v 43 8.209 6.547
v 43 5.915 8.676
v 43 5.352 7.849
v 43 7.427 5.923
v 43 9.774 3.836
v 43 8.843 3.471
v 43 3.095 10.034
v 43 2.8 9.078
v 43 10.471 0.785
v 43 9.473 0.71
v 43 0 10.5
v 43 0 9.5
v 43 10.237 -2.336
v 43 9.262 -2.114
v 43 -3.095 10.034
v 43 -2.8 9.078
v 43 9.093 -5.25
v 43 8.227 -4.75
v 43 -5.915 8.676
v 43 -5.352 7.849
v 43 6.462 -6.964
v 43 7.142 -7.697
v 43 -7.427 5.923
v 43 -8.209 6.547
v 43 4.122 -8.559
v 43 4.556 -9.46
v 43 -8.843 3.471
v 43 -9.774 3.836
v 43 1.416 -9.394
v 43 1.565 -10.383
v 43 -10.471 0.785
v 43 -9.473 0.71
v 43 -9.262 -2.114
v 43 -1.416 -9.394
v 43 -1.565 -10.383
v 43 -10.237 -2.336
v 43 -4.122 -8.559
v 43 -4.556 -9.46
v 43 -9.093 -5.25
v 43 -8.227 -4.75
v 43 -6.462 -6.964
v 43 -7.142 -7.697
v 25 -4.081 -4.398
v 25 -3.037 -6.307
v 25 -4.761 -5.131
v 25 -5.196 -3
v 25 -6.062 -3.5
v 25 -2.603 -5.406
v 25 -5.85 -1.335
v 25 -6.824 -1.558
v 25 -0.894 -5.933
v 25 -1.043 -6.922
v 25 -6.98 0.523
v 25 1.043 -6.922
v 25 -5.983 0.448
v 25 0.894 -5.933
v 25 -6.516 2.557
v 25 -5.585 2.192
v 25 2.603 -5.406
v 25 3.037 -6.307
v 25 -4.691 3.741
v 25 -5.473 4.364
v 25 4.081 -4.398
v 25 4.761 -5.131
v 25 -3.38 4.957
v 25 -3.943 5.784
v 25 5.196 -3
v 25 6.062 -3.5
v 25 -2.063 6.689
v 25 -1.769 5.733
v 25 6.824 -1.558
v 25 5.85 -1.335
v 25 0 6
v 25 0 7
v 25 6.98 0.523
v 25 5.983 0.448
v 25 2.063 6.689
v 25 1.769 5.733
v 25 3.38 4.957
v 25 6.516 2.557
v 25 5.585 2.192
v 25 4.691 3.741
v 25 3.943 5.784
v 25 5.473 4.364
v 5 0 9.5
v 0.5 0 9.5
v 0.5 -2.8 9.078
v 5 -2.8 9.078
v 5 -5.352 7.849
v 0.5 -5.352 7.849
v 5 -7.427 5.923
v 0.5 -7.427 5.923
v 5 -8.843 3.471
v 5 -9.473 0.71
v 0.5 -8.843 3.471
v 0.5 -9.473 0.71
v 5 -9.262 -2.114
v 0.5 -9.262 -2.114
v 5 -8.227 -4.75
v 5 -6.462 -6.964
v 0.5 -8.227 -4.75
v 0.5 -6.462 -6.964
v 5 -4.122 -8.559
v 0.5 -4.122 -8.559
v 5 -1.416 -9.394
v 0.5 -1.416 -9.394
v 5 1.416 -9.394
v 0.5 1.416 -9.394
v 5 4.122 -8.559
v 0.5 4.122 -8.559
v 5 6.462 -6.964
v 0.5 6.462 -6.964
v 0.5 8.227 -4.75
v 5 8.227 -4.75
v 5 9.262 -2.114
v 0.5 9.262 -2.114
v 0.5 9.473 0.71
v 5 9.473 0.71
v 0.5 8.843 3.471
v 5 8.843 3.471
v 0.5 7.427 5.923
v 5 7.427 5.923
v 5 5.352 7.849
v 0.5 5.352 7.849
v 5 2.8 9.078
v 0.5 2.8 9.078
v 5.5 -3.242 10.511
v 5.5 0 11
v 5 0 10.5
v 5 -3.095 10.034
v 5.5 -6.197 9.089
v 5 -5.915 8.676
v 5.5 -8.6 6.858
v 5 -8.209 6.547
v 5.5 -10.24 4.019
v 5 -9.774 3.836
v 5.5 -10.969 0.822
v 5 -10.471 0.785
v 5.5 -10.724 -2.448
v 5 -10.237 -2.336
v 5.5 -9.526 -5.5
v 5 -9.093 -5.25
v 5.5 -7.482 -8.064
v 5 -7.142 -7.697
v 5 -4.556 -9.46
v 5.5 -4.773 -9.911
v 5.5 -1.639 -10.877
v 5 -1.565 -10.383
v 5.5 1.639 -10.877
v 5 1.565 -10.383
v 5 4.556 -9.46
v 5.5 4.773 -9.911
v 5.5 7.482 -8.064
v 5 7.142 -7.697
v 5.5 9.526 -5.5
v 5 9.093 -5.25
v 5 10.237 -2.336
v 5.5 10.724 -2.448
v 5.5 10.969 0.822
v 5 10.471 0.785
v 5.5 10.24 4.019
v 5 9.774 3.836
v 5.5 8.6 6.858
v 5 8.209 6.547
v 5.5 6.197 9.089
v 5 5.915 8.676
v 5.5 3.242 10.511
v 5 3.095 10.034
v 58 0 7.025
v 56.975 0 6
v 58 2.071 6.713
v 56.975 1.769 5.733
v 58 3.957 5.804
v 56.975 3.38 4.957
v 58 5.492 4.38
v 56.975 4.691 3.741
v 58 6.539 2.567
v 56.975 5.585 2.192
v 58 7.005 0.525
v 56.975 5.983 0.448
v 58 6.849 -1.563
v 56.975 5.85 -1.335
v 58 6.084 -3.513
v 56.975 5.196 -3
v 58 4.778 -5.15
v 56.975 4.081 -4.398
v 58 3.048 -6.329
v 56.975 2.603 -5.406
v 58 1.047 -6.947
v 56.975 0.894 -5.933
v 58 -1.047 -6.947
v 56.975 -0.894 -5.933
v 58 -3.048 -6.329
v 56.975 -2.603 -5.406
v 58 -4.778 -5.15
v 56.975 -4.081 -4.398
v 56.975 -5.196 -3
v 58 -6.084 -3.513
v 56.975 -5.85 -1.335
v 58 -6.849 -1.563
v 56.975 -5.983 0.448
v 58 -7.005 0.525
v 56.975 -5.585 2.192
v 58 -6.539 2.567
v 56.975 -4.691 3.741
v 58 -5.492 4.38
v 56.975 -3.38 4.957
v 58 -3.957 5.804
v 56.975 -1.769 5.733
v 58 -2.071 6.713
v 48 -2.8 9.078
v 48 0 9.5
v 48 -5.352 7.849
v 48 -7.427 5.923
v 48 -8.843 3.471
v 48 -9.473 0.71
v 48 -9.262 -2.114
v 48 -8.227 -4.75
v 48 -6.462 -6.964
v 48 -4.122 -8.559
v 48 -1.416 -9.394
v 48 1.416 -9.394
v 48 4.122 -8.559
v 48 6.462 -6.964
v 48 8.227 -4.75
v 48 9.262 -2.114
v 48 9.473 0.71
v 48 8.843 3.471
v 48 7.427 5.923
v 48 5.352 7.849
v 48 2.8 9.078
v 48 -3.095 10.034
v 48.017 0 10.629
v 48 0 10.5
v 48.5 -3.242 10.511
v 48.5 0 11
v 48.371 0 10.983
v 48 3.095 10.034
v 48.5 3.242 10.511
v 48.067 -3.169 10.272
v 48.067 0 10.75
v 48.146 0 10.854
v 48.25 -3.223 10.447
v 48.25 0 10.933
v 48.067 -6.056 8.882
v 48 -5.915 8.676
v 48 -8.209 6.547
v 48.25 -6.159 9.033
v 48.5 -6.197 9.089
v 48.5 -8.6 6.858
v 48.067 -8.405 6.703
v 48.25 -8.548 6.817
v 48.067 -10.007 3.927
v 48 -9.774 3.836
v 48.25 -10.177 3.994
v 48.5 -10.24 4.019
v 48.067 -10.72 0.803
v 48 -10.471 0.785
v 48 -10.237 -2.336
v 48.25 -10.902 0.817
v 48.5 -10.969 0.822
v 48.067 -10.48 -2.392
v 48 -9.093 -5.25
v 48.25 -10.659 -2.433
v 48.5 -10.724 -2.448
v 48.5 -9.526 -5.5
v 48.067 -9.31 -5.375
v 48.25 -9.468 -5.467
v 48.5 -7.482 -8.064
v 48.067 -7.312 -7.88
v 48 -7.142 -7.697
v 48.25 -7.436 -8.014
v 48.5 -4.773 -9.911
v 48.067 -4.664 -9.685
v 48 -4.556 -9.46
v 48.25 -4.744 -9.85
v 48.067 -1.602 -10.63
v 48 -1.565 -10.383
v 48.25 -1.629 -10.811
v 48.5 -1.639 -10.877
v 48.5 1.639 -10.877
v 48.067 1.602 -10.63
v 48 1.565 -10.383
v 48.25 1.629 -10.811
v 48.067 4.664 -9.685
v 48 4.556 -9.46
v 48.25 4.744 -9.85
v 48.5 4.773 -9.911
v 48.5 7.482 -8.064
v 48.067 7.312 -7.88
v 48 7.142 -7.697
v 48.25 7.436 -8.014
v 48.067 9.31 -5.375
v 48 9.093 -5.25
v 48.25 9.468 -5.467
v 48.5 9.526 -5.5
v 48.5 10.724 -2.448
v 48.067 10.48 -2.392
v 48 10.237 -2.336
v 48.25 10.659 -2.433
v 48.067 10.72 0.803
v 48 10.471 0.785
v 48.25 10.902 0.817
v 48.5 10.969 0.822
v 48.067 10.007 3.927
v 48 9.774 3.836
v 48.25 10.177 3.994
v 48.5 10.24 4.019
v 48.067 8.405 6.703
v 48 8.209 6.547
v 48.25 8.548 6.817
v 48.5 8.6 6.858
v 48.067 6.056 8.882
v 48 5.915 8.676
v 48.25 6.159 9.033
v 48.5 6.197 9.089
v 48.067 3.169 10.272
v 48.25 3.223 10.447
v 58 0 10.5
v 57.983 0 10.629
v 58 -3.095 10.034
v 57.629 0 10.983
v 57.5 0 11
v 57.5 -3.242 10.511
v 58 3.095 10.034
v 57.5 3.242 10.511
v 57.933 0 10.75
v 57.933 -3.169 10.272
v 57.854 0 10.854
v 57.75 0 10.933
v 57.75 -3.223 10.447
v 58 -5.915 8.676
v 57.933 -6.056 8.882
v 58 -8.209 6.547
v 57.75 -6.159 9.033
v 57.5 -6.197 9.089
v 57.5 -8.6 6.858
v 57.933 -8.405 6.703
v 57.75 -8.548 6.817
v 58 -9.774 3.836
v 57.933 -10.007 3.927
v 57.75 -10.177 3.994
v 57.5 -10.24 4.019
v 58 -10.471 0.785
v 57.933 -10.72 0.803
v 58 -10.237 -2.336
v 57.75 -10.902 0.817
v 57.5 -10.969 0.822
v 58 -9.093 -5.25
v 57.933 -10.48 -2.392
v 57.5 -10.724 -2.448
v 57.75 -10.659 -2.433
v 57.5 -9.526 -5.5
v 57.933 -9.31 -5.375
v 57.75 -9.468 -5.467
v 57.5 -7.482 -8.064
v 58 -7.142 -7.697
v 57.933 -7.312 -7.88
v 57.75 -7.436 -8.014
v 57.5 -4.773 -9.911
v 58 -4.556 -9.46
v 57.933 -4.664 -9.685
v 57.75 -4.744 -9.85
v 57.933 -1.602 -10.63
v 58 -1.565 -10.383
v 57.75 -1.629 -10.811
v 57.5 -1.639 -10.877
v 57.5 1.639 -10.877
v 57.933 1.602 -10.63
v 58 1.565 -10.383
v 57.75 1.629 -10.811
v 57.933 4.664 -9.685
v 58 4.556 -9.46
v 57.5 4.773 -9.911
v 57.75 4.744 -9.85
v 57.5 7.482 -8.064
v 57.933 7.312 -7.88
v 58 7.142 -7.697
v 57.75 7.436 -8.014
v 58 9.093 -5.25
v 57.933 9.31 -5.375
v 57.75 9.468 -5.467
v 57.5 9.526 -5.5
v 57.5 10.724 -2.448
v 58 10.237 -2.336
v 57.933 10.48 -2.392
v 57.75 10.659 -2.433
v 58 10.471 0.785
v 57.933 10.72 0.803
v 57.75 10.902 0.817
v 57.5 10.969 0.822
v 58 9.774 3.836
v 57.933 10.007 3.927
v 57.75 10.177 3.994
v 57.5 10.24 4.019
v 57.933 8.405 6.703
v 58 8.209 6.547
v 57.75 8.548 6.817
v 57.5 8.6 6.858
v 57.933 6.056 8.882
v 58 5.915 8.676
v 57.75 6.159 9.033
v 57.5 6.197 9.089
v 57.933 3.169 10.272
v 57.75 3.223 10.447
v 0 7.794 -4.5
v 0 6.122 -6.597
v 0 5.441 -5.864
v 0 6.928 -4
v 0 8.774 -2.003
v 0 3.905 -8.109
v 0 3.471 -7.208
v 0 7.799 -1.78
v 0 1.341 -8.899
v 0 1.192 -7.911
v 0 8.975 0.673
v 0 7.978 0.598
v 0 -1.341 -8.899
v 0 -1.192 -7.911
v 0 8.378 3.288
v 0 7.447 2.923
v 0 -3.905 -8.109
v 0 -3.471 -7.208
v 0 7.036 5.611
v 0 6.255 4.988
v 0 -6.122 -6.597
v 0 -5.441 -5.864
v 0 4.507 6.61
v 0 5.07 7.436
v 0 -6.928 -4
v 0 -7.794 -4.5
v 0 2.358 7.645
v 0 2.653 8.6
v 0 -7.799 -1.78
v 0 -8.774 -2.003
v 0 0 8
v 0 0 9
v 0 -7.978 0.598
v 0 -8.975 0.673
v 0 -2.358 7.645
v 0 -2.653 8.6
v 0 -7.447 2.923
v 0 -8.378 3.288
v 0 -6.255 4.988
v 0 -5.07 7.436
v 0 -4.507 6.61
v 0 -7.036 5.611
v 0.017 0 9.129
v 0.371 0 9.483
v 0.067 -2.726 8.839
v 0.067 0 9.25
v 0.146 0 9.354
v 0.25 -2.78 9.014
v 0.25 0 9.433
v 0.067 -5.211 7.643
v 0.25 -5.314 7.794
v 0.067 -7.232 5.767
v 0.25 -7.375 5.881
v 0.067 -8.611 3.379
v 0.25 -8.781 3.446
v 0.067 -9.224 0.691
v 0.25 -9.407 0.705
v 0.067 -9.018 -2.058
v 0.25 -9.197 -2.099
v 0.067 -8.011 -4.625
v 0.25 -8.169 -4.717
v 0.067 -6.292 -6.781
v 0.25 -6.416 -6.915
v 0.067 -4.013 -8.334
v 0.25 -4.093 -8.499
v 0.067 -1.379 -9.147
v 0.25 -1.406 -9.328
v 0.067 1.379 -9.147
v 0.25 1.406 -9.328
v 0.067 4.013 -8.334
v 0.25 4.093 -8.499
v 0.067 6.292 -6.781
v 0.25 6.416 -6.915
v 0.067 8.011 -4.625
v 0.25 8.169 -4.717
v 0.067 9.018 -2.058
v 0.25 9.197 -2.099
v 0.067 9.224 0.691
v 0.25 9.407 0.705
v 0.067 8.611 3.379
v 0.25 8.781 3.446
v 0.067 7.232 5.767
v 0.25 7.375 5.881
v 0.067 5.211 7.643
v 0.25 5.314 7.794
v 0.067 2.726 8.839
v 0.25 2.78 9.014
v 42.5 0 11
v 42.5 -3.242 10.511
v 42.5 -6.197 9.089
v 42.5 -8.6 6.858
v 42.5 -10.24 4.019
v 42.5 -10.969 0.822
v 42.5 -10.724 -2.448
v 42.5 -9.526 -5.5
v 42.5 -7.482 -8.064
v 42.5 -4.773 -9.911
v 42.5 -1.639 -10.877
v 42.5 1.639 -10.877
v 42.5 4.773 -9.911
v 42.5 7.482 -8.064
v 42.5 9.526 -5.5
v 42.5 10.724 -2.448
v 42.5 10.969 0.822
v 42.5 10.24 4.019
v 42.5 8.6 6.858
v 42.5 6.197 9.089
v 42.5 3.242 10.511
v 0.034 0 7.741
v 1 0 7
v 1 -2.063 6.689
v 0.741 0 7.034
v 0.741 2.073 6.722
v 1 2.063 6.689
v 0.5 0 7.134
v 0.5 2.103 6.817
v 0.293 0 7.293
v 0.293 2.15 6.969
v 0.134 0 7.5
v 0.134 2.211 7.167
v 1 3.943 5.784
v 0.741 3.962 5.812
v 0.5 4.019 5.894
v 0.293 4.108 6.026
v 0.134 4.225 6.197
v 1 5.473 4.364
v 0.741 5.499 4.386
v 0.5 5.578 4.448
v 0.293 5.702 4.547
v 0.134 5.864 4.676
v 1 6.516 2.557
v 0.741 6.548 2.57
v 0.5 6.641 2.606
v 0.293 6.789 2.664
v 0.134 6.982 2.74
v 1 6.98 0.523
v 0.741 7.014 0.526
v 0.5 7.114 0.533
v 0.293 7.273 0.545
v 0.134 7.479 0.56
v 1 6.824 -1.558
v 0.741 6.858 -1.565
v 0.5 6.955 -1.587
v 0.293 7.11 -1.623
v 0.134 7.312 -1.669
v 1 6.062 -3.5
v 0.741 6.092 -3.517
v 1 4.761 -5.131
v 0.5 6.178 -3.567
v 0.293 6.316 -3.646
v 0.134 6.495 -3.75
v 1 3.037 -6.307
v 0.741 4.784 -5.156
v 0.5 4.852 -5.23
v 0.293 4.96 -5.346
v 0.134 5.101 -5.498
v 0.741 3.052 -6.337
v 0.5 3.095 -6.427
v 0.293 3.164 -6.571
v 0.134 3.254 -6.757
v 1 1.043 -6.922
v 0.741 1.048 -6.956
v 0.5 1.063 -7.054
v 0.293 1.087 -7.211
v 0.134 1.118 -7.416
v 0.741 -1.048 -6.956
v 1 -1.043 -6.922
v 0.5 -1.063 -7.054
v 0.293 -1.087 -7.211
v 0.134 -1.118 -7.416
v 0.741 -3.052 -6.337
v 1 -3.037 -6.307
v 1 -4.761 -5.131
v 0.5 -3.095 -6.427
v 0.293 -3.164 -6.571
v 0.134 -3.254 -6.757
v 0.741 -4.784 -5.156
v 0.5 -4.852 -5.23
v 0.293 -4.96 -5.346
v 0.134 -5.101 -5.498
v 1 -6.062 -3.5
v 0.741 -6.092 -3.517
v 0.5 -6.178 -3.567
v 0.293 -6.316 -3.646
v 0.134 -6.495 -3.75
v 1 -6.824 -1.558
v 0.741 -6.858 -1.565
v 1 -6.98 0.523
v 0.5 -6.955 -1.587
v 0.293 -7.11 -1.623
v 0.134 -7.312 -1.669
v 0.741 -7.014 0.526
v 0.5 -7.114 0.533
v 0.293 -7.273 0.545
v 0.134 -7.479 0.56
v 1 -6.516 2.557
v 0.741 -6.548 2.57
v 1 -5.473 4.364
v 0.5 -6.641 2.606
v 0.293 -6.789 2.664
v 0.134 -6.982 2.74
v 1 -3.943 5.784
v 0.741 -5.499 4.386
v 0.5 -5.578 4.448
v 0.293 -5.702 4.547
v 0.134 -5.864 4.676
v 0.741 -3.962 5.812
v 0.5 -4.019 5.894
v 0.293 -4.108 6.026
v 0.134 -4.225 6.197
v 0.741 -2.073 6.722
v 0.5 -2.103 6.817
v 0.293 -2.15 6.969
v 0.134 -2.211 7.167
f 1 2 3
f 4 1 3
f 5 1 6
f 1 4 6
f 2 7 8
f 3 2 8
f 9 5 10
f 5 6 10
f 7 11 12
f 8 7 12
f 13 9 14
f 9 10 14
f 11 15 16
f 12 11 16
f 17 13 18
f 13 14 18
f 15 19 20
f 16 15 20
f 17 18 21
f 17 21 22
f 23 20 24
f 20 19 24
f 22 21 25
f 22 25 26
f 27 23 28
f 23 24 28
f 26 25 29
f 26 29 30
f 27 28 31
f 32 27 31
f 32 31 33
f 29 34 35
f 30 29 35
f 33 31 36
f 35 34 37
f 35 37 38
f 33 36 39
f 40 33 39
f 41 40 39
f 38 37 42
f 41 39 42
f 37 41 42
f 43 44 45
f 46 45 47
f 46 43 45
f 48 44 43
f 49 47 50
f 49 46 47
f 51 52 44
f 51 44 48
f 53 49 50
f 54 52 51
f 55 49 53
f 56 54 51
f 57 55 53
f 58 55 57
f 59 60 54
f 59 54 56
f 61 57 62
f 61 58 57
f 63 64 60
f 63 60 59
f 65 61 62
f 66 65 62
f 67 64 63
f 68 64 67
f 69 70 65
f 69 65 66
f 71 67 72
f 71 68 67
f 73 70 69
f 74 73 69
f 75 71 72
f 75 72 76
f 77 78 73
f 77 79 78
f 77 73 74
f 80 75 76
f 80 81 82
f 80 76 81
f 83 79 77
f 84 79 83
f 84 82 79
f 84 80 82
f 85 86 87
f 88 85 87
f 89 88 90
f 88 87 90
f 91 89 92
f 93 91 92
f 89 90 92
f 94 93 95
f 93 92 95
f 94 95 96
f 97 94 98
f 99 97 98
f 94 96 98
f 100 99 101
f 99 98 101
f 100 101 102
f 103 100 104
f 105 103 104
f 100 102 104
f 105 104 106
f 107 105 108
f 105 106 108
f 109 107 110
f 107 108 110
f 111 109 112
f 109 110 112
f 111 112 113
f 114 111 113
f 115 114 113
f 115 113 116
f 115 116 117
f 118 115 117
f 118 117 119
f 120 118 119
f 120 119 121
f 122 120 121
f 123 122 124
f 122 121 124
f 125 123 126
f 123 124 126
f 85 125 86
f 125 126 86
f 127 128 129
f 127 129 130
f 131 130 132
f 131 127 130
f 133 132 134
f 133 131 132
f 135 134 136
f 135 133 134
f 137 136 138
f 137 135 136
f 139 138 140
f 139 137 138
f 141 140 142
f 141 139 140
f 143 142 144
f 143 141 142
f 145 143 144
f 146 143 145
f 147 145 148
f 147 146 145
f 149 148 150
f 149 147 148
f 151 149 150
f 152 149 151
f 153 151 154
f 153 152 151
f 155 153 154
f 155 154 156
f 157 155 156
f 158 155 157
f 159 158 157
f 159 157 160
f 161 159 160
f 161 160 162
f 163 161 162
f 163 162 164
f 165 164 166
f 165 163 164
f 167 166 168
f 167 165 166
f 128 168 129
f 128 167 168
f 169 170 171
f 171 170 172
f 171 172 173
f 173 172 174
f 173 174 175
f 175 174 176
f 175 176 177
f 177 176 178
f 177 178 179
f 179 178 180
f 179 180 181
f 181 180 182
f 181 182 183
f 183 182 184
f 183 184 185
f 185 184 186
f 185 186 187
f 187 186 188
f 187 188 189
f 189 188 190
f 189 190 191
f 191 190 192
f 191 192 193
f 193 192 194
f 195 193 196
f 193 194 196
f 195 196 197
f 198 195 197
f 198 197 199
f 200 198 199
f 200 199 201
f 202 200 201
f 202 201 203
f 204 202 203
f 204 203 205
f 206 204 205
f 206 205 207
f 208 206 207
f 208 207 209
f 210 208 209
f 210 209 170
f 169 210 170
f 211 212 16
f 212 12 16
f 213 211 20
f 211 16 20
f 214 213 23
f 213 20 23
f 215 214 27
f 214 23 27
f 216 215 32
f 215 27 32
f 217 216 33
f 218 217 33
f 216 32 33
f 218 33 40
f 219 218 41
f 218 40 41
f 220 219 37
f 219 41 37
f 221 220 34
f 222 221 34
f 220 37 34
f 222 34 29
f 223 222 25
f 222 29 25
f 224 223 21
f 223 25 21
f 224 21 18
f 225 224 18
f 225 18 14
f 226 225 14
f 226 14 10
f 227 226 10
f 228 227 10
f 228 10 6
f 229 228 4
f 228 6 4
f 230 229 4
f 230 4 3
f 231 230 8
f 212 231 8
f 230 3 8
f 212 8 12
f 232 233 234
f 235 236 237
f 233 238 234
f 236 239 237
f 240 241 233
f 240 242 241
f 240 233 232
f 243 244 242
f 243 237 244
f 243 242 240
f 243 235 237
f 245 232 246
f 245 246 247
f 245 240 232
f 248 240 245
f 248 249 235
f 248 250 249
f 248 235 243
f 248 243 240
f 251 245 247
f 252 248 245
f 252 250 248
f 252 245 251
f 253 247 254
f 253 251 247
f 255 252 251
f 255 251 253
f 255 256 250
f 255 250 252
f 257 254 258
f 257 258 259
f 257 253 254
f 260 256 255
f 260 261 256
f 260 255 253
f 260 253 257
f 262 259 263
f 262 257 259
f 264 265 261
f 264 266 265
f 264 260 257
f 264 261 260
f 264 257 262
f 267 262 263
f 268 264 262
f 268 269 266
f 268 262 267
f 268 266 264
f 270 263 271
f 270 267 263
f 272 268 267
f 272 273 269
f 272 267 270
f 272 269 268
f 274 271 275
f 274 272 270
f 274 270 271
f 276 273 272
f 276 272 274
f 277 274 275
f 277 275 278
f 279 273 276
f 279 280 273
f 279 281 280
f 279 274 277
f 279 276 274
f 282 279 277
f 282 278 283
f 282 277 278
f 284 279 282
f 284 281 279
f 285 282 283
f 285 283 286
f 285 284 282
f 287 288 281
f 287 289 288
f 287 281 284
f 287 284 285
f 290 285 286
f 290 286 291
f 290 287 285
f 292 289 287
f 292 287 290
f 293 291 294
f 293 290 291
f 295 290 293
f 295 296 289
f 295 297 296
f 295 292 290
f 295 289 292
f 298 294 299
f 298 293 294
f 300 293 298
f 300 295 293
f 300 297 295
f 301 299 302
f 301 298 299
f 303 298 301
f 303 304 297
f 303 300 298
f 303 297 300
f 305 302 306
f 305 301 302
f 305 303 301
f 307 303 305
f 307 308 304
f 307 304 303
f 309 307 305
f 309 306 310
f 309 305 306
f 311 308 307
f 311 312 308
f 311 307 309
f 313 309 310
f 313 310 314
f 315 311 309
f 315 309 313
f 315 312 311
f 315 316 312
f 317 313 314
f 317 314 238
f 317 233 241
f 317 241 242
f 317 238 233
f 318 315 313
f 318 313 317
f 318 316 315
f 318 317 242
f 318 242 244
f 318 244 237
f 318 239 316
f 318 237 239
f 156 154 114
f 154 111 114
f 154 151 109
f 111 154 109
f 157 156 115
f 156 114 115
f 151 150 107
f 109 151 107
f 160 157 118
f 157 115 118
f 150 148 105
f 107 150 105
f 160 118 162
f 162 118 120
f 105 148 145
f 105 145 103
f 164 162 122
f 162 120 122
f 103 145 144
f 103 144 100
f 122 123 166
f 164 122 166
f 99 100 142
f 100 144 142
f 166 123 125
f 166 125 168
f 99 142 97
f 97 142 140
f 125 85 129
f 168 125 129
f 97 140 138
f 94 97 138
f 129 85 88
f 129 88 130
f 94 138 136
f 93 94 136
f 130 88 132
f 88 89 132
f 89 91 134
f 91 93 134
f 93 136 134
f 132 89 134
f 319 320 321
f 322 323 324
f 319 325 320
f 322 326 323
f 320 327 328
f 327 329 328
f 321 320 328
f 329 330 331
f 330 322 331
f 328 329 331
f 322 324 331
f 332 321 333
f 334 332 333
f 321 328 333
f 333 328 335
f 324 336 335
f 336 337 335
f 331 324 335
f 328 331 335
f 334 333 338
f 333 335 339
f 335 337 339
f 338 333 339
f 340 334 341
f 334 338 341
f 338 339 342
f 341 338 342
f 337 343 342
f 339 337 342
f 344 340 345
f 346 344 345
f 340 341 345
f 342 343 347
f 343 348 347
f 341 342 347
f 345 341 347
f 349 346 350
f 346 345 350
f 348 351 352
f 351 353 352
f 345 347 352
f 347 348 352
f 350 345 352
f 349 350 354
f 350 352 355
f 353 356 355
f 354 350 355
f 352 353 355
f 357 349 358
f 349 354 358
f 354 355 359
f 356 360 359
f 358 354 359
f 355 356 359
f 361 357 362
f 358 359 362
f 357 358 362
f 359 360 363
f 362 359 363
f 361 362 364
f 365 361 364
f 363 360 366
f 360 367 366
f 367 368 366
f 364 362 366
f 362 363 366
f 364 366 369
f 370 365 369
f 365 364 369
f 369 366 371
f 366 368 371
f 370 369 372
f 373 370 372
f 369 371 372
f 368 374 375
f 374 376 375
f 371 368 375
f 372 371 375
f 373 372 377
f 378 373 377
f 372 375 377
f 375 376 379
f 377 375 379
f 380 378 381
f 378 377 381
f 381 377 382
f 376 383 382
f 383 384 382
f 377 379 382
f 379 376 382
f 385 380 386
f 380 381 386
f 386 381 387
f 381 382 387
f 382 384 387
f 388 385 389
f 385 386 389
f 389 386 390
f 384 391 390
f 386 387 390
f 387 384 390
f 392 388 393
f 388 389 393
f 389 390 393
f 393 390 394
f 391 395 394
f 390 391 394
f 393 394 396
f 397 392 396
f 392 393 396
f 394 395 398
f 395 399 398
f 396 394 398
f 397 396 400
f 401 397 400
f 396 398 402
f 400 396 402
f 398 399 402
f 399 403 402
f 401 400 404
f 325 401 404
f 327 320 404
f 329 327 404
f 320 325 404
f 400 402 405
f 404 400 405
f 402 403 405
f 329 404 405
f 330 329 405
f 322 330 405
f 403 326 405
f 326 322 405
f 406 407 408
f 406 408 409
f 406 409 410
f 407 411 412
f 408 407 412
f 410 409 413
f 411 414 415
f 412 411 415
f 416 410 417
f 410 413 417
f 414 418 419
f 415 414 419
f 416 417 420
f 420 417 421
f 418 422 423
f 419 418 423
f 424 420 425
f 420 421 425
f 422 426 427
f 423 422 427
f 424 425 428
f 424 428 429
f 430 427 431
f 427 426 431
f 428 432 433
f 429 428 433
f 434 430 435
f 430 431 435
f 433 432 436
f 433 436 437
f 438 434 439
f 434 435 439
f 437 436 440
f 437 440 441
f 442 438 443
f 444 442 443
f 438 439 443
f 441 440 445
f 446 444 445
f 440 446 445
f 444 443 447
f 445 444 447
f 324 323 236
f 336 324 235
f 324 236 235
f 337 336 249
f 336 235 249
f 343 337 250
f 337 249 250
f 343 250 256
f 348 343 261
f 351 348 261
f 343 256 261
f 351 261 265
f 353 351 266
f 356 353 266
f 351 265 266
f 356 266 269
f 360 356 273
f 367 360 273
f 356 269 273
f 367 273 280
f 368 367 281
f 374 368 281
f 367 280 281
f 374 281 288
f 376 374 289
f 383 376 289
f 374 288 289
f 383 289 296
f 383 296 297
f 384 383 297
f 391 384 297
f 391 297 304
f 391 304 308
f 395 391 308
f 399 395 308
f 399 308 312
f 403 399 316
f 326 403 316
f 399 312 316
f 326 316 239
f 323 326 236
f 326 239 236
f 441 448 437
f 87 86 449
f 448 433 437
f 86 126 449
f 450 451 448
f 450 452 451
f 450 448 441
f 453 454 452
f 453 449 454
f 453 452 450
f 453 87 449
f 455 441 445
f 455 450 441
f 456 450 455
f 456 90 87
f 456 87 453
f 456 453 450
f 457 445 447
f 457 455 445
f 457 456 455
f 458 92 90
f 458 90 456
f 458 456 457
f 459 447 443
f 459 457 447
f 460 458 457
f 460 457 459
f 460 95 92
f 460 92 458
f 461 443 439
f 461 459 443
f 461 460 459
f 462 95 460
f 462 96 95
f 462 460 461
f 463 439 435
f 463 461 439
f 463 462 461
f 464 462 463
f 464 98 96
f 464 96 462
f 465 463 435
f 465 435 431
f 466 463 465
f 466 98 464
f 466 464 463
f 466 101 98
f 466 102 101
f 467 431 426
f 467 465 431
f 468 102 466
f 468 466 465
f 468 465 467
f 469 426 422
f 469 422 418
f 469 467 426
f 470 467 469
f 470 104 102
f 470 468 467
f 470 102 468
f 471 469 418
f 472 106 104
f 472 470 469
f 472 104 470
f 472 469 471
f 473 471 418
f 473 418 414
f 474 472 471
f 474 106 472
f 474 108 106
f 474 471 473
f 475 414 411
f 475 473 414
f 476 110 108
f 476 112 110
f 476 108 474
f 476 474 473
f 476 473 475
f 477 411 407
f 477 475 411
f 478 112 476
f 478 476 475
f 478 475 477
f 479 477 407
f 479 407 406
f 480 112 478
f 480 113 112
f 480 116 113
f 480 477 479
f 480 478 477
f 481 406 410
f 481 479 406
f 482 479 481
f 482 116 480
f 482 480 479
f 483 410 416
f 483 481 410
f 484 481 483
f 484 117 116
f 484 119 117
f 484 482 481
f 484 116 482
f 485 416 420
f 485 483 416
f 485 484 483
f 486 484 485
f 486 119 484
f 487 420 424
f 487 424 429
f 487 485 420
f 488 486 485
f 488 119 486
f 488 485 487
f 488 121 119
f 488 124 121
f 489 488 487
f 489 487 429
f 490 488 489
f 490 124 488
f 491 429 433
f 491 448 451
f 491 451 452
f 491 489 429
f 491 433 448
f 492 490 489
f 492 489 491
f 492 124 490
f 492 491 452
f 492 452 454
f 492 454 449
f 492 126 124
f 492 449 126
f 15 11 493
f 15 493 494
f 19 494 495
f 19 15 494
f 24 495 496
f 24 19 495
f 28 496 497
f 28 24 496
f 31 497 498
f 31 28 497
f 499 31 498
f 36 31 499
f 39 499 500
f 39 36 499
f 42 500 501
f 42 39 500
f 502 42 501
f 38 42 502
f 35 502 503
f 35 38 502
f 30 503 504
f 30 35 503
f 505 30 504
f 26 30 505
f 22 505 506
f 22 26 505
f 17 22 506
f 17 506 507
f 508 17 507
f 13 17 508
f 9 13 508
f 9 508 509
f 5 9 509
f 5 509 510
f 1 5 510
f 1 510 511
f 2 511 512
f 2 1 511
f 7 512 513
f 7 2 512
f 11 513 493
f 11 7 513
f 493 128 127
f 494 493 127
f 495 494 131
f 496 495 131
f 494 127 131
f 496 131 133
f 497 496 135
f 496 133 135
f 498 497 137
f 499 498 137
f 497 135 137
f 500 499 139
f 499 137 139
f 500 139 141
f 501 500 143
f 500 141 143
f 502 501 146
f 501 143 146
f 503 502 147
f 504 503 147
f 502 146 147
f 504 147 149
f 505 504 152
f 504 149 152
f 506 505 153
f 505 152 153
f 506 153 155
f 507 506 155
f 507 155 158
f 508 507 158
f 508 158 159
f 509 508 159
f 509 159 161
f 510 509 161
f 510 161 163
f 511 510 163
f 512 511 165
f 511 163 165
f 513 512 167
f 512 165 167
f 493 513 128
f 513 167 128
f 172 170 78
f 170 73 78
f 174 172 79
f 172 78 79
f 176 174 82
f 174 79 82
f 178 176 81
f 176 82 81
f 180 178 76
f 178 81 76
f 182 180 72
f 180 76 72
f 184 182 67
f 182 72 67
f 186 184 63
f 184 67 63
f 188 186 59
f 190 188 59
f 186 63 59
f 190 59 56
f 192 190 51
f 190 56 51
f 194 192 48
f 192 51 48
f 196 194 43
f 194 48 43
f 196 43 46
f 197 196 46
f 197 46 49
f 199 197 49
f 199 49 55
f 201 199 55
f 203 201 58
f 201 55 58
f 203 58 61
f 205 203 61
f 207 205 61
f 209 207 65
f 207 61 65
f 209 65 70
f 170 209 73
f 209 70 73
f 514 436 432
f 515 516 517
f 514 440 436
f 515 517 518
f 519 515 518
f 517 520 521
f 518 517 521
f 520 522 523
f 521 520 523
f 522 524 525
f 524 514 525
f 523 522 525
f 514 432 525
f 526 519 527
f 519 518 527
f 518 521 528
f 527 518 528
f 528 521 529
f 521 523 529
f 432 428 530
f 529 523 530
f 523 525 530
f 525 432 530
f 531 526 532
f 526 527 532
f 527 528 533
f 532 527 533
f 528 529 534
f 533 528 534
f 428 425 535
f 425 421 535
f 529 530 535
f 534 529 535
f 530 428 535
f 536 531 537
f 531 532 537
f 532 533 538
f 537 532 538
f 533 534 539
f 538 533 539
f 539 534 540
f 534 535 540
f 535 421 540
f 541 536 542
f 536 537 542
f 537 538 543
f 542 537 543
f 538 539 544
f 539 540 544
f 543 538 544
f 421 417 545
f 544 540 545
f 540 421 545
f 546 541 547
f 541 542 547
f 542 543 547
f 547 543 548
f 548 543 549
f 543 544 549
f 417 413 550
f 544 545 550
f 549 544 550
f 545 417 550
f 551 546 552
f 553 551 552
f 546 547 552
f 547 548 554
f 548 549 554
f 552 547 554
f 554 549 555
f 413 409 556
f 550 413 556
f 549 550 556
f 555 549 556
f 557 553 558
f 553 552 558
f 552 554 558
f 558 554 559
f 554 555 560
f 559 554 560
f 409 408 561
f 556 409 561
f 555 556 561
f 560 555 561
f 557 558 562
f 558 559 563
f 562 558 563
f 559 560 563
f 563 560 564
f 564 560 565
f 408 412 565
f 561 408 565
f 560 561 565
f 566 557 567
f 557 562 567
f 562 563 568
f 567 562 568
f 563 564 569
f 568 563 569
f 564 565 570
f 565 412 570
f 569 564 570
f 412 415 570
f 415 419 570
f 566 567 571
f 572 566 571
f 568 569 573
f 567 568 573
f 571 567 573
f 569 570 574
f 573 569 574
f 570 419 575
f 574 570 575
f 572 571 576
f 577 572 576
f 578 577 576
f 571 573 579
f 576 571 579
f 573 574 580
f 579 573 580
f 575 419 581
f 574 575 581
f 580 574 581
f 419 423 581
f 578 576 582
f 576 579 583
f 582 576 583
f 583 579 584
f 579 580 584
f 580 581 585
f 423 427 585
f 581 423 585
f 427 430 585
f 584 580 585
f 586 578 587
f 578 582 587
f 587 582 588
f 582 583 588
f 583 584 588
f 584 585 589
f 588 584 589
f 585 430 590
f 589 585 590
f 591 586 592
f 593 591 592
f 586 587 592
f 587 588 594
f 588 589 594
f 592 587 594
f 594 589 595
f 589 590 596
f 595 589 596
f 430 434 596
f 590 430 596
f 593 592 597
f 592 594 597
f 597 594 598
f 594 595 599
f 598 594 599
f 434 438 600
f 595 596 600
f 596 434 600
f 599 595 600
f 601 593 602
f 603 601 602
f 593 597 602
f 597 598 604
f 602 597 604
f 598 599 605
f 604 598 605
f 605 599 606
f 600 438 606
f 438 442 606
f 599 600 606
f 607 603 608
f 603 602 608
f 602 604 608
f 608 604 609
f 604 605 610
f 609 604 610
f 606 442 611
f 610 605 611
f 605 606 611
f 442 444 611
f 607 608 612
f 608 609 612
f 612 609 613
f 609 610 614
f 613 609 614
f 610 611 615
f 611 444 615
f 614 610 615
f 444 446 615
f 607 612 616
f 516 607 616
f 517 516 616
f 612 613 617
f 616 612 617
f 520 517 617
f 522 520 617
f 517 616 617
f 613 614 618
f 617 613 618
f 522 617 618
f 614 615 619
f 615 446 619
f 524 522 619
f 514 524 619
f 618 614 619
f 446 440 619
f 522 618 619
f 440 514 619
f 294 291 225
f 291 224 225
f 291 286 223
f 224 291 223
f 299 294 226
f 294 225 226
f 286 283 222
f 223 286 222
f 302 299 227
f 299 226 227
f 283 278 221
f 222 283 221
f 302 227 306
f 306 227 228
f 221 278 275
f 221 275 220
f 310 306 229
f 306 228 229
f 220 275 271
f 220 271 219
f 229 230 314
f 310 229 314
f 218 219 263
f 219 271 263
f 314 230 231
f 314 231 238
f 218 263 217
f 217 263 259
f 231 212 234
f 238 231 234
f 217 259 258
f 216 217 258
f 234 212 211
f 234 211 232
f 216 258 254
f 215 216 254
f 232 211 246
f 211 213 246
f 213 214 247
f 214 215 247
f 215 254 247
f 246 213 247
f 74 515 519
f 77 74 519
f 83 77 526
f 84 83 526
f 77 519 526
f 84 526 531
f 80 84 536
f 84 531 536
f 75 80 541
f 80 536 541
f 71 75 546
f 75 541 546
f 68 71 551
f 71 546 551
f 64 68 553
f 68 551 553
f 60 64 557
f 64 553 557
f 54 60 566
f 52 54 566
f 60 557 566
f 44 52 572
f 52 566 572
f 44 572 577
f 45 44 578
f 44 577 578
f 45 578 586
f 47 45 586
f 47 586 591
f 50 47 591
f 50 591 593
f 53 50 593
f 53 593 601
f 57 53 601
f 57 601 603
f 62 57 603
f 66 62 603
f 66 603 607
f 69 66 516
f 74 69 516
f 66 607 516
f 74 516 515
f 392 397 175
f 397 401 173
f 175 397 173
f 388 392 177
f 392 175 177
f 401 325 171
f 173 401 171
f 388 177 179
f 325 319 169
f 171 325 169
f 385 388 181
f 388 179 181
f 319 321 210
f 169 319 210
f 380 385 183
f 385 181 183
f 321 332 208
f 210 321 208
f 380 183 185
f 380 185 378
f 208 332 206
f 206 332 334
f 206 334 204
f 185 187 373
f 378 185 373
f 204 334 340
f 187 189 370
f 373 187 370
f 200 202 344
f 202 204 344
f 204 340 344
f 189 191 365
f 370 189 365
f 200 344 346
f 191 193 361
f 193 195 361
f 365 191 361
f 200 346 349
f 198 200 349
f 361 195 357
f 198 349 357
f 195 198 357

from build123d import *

# Parameters (mm, degrees)
ESBO_O2_R                        = 7
CORTE_EXTRUS_O1_DEPTH            = 25
FURO_ROSCADO_DE_M141_D           = 12
FURO_ROSCADO_DE_M141_DEPTH       = 35
FURO_ROSCADO_DE_M141_CSINK_D     = 14.05
FURO_ROSCADO_DE_M141_CSINK_ANGLE = 90
FURO_ROSCADO_DE_M141_TIP         = 3.605163714
FILETE1_R                        = 0.5
FILETE2_R                        = 1
CHANFRO1_SIZE                    = 0.5


with BuildPart() as part:
    # Esboço1 → Revolução1 (revolve)
    with BuildSketch(Plane.XY, mode=Mode.PRIVATE) as revolu_o1_sk:
        Polygon((0, 0), (58, 0), (58, 11), (48, 11), (48, 9.5), (43, 9.5), (43, 11), (5, 11), (5, 9.5), (0, 9.5), align=None)
    revolve(revolu_o1_sk.sketch.rotate(Axis((0, 0, 0), (1, 0, 0)), 90), axis=Axis((0, 0, 0), (1, 0, 0)))

    # Esboço2 → Corte-extrusão1 (cut)
    with BuildSketch(Plane.ZY):
        Circle(ESBO_O2_R)
    extrude(amount=-CORTE_EXTRUS_O1_DEPTH, mode=Mode.SUBTRACT)

    # Furo roscado de M141
    with Locations(Plane(origin=(58, 0, 0), x_dir=(0, 0, -1), z_dir=(1, 0, 0))):
        with Locations((0, 0)):
            CounterSinkHole(FURO_ROSCADO_DE_M141_D / 2, FURO_ROSCADO_DE_M141_CSINK_D / 2, depth=FURO_ROSCADO_DE_M141_DEPTH, counter_sink_angle=FURO_ROSCADO_DE_M141_CSINK_ANGLE)
            with Locations((0, 0, -(FURO_ROSCADO_DE_M141_DEPTH + FURO_ROSCADO_DE_M141_TIP / 2))):  # 118° drill point
                Cone(0, FURO_ROSCADO_DE_M141_D / 2, FURO_ROSCADO_DE_M141_TIP, mode=Mode.SUBTRACT)

    # Filete1
    filete1_edges = [part.edges().sort_by_distance(p)[0] for p in [
        (58, 0, -11),
        (0, 0, -9.5),
        (48, 0, -11),
    ]]
    fillet(filete1_edges, radius=FILETE1_R)

    # Filete2
    filete2_edges = [part.edges().sort_by_distance(p)[0] for p in [
        (0, 0, -7),
    ]]
    fillet(filete2_edges, radius=FILETE2_R)

    # Chanfro1
    chanfro1_edges = [part.edges().sort_by_distance(p)[0] for p in [
        (5, 0, -11),
        (43, 0, -11),
    ]]
    chamfer(chanfro1_edges, length=CHANFRO1_SIZE)


solid = part.part
